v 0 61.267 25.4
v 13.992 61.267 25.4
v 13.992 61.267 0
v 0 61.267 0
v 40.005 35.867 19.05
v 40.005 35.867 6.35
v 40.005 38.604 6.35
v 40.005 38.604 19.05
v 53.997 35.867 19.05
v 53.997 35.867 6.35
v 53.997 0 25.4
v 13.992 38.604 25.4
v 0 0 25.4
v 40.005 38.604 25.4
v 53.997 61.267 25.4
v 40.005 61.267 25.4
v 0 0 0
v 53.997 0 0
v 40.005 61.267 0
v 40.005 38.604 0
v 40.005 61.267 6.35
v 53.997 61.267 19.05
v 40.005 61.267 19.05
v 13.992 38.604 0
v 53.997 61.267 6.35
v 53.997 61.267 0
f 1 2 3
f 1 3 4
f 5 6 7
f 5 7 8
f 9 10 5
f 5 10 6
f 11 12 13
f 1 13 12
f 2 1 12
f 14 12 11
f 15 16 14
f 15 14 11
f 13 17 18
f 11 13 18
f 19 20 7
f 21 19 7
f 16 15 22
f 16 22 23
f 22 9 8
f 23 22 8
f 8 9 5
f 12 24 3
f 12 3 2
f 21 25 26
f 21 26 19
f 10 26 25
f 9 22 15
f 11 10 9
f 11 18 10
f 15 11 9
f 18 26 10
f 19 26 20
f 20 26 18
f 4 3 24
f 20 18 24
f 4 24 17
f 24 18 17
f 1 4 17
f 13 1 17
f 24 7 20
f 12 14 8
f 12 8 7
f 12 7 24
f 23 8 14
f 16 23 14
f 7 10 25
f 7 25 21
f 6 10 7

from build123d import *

# Parameters (mm, degrees)
F1_DEPTH   = 25.4
F2_W       = 13.9918979257
F2_H       = 6.35
F1_FACE1_W = 26.0131005198
F1_FACE1_H = 25.4
F1_FACE_W  = 13.9918979257
F1_FACE_H  = 25.4
F3_DEPTH   = 25.4


with BuildPart() as f1:
    # F0 (on Top) → F1 (new body)
    with BuildSketch(Plane.XY):
        Polygon((0, 35.8665511012), (0, 0), (53.9968963712, 0), (53.9968963712, 35.8665511012), (40.0049984455, 35.8665511012), (40.0049984455, 13.2036199793), (13.9918979257, 13.2036199793), (13.9918979257, 35.8665511012), align=None)
    extrude(amount=F1_DEPTH)

    # F2 (on face) + F1_face1 (on face) + F1_face (on face) → F3 (join)
    with BuildSketch(Plane(origin=(0, 35.8665511012, 0), x_dir=(-1, 0, 0), z_dir=(0, 1, 0))):
        with Locations((-47.0009474084, 3.175)):
            Rectangle(F2_W, F2_H)
        with Locations((-47.0009474084, 22.225)):
            Rectangle(F2_W, F2_H)
    with BuildSketch(Plane(origin=(26.9984481856, 13.2036199793, 12.7), x_dir=(-1, 0, 0), z_dir=(0, 1, 0))):
        Rectangle(F1_FACE1_W, F1_FACE1_H)
    with BuildSketch(Plane(origin=(47.0009474084, 35.8665511012, 12.7), x_dir=(-1, 0, 0), z_dir=(0, 1, 0))):
        with Locations((40.0049984455, 0)):
            Rectangle(F1_FACE_W, F1_FACE_H)
    extrude(amount=F3_DEPTH)


solid = f1.part
